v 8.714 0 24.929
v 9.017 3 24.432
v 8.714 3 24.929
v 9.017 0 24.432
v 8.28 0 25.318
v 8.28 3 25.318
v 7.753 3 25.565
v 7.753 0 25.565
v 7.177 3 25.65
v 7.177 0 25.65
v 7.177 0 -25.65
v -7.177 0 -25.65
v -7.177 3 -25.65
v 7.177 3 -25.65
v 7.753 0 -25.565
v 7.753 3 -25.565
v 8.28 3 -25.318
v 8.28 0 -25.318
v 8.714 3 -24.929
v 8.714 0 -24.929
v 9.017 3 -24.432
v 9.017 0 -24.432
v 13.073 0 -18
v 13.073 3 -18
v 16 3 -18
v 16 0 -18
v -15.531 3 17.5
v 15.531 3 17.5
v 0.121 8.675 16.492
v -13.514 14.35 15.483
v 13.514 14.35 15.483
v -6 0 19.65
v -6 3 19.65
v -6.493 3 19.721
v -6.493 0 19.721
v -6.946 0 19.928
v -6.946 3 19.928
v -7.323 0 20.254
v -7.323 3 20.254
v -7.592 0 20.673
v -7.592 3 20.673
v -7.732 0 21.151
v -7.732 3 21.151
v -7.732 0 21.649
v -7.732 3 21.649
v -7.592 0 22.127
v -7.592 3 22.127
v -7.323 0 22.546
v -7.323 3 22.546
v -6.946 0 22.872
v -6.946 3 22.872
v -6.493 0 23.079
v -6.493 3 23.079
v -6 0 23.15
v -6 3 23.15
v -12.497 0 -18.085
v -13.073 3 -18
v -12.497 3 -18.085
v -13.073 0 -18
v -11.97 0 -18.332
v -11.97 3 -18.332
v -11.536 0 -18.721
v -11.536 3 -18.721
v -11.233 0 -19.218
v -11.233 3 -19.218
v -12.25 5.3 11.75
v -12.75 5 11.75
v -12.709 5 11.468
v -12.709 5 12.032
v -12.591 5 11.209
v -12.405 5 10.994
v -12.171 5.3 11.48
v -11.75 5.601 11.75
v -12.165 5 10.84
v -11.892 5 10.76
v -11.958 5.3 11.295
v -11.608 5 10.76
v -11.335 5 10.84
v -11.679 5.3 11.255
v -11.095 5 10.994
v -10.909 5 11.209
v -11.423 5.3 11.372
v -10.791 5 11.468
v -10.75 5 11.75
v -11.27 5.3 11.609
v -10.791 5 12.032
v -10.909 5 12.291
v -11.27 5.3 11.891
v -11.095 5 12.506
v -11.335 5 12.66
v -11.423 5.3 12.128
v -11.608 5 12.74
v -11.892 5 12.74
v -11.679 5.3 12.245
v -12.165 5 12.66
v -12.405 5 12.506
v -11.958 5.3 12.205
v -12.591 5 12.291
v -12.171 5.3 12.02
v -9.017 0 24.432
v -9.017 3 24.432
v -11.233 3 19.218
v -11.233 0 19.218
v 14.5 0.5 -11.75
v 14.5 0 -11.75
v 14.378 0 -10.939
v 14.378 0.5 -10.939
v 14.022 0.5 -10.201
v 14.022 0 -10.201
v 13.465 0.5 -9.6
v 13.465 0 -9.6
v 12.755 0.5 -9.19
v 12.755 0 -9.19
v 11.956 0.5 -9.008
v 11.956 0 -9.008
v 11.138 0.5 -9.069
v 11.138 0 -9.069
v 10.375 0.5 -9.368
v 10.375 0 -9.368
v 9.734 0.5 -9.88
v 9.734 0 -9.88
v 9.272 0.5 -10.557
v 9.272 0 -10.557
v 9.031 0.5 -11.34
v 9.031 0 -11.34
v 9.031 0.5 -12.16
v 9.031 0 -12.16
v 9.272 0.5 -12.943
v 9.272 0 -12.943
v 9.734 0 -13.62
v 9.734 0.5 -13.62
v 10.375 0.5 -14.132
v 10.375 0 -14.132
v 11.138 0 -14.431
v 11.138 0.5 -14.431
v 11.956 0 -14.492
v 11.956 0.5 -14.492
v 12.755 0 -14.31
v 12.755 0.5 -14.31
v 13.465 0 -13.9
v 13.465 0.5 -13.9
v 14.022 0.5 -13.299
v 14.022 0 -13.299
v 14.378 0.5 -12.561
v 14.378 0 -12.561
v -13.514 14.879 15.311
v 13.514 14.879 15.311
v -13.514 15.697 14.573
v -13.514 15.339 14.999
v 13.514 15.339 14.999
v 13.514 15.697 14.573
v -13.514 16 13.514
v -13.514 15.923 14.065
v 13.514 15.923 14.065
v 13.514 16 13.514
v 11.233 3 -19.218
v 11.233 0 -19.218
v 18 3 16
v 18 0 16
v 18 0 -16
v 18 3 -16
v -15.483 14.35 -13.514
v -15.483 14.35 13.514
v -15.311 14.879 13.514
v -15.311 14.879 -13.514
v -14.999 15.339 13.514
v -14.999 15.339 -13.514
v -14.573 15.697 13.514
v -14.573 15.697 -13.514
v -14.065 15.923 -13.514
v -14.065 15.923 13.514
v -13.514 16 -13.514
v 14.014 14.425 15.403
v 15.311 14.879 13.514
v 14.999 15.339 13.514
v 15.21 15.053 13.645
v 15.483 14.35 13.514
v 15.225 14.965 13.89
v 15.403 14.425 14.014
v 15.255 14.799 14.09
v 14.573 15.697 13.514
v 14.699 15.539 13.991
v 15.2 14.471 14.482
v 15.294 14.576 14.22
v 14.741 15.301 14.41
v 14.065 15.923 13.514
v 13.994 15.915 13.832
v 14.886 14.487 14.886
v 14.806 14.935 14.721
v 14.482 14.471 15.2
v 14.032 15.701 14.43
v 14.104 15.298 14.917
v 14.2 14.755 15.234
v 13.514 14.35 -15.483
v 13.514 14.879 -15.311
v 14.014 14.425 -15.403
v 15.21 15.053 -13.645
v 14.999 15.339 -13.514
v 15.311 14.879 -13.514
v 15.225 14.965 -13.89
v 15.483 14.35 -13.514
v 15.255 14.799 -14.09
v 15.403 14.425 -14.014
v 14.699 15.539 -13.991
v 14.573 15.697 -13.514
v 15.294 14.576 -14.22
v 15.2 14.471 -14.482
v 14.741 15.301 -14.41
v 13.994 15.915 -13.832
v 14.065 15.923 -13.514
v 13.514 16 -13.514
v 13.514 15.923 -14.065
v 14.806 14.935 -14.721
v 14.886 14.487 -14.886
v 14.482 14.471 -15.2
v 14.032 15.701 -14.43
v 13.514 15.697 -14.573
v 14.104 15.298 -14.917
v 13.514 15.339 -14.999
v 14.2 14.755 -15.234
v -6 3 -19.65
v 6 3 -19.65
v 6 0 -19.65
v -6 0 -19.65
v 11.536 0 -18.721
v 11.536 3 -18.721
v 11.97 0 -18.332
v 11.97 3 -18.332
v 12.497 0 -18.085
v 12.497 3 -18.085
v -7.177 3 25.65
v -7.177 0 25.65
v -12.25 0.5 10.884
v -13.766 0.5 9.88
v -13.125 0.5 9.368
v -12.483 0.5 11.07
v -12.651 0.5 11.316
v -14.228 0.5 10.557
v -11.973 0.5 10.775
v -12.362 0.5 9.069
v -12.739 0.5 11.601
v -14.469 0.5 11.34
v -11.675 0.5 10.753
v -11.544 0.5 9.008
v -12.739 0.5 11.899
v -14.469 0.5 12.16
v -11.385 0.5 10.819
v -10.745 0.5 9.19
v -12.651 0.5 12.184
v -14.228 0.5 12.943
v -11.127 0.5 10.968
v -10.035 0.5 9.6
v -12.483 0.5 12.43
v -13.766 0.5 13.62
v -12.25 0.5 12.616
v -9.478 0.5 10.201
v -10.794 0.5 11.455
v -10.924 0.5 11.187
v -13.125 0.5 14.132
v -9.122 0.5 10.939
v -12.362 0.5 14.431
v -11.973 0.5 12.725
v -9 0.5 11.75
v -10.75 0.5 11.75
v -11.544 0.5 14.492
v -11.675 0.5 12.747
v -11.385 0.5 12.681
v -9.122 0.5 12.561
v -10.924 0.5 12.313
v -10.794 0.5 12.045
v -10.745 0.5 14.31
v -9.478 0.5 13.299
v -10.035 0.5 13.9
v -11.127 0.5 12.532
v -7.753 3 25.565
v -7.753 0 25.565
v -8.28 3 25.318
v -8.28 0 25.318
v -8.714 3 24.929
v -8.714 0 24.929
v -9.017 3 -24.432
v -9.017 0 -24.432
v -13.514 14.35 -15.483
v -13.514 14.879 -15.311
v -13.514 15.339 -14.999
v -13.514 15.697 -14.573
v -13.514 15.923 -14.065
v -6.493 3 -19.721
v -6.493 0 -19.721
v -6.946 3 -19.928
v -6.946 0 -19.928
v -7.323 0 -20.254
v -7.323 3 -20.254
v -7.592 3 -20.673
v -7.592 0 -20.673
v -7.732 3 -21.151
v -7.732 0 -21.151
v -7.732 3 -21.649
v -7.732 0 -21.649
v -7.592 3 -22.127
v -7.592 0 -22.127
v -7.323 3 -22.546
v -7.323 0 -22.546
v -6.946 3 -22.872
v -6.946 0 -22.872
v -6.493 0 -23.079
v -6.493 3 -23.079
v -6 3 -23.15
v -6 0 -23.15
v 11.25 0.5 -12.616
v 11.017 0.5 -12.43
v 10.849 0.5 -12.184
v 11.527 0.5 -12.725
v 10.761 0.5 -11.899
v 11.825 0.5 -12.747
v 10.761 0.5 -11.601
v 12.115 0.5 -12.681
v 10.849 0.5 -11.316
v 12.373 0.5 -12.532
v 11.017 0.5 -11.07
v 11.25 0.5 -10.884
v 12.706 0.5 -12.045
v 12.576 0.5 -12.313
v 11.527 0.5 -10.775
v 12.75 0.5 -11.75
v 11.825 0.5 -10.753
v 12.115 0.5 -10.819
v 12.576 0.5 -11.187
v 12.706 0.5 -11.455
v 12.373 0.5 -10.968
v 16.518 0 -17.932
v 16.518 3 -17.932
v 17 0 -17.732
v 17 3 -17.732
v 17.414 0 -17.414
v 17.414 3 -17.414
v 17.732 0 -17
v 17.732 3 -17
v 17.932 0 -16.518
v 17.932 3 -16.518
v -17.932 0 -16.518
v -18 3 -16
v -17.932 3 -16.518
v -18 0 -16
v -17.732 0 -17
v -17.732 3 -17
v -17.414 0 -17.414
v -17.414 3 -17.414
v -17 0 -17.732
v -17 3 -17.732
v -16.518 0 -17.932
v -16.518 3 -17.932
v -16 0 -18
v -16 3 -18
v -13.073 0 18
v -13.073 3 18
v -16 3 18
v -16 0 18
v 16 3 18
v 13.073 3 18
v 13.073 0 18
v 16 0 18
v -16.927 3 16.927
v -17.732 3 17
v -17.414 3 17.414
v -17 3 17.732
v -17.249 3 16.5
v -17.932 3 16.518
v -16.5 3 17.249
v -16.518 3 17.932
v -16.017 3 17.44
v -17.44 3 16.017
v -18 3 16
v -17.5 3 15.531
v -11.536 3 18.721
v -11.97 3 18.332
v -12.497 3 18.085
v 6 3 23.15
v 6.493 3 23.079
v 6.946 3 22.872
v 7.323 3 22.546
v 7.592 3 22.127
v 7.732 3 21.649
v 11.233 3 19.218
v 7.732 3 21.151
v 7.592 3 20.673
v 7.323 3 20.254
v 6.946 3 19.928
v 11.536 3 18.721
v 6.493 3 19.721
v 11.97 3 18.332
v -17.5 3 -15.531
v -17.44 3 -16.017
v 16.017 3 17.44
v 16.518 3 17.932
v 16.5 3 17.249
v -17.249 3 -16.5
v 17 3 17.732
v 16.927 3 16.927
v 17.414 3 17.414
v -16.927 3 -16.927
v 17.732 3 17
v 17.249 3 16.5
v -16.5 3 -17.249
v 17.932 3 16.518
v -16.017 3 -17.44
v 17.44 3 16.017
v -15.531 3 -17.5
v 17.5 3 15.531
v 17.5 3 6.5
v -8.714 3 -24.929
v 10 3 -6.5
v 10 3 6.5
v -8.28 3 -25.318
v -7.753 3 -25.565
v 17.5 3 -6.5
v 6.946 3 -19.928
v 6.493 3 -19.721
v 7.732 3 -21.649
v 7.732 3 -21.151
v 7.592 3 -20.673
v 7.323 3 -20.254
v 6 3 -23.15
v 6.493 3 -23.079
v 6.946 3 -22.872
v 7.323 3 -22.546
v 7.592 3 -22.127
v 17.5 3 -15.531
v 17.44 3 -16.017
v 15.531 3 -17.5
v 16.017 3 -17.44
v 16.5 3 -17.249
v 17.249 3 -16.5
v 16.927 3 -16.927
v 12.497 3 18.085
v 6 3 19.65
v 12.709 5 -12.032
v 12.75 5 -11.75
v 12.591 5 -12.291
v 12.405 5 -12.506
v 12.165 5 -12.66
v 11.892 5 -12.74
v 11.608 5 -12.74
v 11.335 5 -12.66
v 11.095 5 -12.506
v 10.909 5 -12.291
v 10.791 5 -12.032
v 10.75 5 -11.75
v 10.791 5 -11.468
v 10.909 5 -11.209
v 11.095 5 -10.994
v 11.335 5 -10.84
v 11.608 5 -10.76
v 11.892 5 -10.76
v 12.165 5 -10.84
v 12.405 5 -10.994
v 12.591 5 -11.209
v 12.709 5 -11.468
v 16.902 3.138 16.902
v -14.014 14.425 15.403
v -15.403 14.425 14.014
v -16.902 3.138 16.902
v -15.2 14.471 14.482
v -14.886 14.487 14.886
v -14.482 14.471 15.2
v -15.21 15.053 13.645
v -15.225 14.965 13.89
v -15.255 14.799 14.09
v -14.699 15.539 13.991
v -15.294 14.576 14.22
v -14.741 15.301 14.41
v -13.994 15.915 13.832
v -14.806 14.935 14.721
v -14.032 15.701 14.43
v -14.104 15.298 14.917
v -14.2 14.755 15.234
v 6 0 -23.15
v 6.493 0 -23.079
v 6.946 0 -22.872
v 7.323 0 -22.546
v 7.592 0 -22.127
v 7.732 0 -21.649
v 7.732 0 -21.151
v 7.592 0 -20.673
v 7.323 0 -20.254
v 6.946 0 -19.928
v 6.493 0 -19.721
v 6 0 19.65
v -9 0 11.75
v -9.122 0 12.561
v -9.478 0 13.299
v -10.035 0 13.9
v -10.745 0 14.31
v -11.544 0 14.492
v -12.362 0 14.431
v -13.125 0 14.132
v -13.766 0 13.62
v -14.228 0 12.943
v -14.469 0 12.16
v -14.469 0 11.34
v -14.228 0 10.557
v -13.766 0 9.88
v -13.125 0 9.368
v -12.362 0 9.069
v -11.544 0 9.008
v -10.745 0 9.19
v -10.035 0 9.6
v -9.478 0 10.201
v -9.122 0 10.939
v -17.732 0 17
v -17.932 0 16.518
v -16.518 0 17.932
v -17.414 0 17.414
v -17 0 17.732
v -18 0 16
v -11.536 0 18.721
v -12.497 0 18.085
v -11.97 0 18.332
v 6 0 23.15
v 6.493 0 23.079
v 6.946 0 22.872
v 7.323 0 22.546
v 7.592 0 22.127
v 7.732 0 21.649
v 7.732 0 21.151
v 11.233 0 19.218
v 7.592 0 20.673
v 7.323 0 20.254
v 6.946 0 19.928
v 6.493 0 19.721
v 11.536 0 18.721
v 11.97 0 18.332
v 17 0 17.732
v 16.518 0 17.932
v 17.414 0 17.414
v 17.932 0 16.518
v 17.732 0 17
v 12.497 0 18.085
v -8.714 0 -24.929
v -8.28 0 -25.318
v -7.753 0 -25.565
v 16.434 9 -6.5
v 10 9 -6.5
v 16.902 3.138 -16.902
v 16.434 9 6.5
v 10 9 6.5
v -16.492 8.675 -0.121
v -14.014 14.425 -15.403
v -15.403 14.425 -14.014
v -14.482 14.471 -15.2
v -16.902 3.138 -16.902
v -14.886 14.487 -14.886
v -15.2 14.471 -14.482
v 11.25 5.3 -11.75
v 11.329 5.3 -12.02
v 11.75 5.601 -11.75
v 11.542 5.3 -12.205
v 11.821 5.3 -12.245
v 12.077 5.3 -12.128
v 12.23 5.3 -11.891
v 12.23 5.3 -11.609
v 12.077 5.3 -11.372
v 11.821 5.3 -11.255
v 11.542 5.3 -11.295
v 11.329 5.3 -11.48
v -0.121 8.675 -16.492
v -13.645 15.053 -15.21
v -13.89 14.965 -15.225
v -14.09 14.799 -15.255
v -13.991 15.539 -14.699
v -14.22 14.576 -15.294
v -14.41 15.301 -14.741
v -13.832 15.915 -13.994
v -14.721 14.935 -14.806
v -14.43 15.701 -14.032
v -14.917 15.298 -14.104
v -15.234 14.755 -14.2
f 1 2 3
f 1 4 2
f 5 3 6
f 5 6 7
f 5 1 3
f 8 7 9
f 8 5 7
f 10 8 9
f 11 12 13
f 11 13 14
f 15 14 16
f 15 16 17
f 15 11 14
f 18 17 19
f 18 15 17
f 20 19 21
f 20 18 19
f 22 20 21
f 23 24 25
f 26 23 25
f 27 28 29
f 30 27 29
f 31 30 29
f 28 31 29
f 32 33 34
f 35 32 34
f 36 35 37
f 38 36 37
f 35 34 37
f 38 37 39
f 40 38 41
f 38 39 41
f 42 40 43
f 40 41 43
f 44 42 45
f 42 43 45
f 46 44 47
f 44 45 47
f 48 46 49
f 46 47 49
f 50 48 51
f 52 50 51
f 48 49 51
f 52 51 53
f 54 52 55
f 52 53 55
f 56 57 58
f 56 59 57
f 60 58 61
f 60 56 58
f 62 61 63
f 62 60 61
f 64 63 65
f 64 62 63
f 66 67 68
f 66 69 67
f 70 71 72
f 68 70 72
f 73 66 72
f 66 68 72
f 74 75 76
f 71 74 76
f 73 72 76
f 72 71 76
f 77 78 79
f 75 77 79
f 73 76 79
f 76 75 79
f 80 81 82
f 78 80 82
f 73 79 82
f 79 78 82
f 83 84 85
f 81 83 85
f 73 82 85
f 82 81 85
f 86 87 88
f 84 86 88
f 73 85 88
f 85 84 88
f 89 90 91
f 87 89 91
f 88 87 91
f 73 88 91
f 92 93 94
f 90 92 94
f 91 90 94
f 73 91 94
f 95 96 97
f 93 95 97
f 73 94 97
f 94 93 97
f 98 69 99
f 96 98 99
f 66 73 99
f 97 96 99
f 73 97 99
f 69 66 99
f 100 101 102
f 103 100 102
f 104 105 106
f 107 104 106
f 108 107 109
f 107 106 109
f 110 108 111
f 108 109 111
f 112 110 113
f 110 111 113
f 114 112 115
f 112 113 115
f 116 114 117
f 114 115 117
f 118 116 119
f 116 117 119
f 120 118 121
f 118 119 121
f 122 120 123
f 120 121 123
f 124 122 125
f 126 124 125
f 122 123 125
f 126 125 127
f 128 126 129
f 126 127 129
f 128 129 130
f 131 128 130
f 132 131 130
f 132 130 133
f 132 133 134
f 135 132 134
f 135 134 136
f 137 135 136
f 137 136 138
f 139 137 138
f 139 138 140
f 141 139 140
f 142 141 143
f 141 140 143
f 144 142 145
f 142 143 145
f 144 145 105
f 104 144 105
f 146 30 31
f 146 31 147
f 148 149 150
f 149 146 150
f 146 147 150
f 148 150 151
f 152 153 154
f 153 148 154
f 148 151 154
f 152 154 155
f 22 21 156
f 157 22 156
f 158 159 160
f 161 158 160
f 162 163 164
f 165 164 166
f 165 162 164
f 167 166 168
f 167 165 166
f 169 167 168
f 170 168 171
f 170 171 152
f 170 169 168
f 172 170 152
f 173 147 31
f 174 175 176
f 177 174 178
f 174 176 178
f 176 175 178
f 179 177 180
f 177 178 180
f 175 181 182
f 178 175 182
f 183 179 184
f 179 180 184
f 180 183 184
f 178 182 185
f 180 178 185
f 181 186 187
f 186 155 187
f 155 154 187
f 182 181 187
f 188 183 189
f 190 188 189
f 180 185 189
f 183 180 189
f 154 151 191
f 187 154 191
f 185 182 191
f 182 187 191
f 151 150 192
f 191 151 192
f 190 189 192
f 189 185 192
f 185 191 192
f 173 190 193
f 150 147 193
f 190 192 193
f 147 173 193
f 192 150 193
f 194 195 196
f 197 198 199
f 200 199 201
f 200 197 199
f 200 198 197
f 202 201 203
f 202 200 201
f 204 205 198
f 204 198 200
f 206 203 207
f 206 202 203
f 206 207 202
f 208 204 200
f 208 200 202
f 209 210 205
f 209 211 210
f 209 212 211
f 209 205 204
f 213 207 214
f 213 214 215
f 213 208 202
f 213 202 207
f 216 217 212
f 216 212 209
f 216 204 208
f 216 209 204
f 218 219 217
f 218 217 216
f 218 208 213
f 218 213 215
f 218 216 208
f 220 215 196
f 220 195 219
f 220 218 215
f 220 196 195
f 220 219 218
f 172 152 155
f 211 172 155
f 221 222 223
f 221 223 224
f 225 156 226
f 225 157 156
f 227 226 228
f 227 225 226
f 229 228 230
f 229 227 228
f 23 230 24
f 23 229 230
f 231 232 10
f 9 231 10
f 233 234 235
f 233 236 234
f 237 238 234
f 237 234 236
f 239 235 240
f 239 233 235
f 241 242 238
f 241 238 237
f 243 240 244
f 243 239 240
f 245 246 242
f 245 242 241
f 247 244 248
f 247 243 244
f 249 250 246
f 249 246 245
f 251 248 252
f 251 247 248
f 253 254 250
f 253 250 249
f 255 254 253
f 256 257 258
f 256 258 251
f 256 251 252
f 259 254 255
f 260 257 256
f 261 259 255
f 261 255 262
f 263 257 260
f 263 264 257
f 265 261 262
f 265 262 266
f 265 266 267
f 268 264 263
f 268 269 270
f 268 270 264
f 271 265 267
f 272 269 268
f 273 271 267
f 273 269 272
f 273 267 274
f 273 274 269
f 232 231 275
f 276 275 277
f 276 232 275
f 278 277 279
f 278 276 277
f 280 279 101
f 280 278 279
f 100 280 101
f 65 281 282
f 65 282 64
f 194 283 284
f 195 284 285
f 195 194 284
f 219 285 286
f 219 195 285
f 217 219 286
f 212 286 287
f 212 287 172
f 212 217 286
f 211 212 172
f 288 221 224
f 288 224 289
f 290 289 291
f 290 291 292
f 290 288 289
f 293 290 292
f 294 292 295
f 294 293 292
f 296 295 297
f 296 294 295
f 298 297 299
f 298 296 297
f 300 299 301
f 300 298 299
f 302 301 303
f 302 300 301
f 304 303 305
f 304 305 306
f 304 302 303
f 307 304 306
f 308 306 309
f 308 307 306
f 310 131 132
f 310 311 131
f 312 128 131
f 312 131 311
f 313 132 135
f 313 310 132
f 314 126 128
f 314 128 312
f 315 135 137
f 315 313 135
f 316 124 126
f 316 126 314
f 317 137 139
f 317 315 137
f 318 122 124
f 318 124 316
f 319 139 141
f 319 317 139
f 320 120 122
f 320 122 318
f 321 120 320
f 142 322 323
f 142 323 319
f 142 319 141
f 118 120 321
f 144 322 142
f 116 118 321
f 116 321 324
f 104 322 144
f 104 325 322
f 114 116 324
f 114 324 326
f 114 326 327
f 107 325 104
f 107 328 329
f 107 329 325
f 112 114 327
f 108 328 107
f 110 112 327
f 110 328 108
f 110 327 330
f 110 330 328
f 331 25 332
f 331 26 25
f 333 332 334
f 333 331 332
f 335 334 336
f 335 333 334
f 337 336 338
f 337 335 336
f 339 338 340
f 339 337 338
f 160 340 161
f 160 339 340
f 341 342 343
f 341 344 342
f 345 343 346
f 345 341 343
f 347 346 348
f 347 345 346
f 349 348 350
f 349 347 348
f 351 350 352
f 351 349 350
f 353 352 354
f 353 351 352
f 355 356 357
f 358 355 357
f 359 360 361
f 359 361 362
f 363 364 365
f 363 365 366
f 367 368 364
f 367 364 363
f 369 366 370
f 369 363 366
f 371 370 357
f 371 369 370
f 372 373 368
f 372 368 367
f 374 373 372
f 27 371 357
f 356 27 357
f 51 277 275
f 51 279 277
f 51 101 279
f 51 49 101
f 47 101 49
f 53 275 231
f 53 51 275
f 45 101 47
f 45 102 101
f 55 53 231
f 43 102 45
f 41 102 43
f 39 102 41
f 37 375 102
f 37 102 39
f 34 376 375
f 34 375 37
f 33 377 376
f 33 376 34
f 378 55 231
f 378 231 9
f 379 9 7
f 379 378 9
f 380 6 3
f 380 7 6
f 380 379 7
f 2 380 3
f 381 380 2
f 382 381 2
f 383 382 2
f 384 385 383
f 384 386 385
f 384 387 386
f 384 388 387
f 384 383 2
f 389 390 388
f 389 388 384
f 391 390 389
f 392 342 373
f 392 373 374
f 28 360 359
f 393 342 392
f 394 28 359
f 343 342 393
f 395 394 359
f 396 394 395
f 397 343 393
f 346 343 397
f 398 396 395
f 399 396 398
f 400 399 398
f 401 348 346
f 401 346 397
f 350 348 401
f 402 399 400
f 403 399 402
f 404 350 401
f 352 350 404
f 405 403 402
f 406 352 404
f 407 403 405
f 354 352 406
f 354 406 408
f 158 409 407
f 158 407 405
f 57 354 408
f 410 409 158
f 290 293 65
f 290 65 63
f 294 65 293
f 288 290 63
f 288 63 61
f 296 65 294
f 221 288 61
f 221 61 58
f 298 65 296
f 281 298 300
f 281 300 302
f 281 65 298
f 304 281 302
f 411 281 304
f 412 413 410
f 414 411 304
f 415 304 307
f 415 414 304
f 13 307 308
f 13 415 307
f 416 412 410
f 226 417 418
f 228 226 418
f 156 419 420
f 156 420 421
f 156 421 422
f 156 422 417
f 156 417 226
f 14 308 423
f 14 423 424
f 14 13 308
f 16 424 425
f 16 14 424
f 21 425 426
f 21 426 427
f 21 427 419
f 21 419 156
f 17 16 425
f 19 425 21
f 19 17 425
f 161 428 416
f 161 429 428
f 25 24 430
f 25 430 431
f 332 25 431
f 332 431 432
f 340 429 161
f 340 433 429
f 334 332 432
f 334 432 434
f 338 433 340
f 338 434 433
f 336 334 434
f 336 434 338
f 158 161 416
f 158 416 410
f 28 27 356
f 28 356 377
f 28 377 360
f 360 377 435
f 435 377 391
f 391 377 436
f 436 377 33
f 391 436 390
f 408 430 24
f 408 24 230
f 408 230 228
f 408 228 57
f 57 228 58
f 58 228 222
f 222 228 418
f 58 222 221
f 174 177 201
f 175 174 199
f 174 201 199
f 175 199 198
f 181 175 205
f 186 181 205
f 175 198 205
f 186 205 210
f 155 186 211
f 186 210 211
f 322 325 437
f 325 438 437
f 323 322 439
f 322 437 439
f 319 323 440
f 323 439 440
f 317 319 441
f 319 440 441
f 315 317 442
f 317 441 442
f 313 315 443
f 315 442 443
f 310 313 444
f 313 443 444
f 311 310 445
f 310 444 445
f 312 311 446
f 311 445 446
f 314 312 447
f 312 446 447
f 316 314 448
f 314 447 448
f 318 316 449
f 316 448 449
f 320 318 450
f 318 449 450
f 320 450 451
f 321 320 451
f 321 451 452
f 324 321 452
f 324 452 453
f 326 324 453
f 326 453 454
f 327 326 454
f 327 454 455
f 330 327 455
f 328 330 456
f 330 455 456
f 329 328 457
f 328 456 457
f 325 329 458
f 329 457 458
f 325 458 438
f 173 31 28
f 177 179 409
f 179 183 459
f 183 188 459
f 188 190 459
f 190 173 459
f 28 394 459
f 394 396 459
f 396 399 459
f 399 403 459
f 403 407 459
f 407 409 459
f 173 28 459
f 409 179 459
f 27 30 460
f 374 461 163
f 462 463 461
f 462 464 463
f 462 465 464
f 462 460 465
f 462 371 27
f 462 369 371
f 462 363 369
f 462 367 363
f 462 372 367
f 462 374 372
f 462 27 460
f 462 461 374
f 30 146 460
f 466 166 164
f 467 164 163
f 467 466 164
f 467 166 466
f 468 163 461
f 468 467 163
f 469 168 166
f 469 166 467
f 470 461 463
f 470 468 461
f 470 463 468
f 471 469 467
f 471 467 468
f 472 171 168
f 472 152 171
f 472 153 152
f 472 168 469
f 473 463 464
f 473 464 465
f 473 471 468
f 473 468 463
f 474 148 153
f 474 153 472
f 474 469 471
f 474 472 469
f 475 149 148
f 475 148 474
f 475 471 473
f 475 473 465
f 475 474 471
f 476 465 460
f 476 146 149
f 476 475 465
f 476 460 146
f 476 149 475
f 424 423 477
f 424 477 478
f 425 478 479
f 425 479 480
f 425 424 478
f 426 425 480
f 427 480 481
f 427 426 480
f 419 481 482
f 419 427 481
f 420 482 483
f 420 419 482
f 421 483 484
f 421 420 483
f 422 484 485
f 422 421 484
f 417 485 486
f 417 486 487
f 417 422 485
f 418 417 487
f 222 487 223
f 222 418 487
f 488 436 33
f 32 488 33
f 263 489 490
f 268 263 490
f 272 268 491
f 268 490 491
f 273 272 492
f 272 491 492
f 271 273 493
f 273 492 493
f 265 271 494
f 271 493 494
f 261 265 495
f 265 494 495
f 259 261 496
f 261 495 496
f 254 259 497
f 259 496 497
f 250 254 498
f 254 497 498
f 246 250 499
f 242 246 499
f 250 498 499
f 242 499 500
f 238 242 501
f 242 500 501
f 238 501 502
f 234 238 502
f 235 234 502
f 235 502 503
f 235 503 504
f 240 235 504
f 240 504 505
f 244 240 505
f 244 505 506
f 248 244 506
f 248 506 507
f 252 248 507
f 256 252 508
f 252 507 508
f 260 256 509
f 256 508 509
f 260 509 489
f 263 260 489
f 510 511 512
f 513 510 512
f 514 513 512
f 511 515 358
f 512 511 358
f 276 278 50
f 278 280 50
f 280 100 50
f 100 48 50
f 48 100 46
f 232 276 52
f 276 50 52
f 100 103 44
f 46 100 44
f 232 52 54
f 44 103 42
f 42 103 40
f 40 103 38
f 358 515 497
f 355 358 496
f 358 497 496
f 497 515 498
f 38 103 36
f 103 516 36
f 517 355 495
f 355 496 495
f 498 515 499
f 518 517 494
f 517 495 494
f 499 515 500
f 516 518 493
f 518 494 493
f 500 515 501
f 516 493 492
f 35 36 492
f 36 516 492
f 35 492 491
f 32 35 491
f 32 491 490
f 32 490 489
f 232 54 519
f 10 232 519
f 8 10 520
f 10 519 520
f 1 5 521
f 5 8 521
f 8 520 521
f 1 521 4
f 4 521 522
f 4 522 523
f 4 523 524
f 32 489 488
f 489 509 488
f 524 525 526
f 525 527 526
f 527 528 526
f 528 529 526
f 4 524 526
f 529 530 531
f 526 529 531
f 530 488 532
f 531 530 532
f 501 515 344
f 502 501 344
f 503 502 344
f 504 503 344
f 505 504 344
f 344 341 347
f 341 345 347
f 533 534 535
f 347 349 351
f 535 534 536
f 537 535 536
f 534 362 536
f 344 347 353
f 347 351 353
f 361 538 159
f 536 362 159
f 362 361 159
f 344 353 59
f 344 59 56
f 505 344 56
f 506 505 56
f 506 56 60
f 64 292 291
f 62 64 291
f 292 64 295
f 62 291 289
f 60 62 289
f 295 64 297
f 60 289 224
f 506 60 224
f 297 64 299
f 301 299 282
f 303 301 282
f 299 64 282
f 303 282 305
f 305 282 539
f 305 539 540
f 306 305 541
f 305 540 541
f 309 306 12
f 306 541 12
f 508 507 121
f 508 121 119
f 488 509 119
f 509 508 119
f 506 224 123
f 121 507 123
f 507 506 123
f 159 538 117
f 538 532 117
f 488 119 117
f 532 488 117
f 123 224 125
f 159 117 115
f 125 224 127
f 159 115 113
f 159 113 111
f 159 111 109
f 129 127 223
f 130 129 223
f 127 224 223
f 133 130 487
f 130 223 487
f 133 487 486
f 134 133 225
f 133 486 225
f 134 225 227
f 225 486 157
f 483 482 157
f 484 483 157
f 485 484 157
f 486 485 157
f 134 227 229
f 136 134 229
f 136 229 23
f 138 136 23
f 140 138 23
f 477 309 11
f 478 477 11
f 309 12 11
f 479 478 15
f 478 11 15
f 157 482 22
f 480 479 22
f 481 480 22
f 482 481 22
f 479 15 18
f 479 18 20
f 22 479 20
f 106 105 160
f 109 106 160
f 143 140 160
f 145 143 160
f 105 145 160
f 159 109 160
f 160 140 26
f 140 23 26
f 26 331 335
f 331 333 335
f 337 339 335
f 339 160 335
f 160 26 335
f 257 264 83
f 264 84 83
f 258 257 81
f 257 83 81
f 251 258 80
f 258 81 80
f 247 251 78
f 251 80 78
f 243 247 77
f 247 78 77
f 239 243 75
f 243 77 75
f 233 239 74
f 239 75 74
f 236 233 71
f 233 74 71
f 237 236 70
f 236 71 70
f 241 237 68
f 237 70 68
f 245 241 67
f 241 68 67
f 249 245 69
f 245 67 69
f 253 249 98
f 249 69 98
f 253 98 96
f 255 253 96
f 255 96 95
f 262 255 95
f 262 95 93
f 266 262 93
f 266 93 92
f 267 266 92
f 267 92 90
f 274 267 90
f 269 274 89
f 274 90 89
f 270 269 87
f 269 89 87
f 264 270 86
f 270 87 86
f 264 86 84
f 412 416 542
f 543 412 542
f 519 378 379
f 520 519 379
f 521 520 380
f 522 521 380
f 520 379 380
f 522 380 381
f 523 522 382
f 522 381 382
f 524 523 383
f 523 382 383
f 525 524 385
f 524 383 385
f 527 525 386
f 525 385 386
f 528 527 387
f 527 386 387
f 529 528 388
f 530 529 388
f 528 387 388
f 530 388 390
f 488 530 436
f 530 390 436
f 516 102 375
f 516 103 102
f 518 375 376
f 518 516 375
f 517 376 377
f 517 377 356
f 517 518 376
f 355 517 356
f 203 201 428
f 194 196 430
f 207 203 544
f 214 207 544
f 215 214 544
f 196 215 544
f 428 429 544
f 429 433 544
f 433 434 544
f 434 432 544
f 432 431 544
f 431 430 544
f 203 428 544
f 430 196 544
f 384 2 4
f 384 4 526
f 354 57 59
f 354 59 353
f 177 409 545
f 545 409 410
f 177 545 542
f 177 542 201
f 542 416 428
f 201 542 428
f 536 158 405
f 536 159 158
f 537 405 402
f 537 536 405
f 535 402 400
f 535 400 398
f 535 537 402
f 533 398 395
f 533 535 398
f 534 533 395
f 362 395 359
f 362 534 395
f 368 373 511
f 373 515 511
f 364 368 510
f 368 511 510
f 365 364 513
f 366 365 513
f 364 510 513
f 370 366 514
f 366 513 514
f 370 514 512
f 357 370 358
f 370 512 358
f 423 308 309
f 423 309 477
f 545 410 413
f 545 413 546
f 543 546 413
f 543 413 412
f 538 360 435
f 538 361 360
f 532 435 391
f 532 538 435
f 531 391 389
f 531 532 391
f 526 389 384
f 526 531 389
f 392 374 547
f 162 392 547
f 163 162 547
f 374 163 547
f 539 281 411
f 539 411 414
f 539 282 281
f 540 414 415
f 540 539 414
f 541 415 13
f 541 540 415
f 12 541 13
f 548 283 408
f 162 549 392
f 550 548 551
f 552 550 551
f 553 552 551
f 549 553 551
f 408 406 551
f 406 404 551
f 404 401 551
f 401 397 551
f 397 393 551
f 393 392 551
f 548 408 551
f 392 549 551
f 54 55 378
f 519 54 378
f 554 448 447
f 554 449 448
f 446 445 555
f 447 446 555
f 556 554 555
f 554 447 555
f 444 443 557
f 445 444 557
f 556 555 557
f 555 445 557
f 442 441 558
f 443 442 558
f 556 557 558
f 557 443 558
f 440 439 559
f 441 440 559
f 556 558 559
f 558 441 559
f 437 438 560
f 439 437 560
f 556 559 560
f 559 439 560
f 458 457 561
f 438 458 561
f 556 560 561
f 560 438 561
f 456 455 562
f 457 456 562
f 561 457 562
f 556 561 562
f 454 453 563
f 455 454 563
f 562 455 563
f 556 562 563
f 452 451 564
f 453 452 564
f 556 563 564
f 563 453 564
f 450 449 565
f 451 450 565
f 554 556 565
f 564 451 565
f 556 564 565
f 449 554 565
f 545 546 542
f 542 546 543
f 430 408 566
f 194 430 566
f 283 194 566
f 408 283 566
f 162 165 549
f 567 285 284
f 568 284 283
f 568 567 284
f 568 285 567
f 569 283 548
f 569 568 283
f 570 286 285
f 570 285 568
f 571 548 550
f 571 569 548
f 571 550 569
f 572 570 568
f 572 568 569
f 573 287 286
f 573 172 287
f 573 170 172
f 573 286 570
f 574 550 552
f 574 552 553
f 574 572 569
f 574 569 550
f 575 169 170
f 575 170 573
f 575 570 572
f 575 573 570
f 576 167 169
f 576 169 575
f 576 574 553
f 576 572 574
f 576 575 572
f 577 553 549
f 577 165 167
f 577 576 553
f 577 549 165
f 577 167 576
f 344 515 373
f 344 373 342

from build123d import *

# Parameters (mm, degrees)
SKETCH_1_W          = 36
SKETCH_1_H          = 51.3
EXTRUDE_1_DEPTH     = 3
CUT_EXTRUDE_1_DEPTH = 3
SKETCH_5_W          = 30.38
SKETCH_5_H          = 30.38
SKETCH_4_W          = 35
SKETCH_4_H          = 35
FILLET_1_R          = 2
CUT_EXTRUDE_3_DEPTH = 13
FILLET_2_R          = 2
SKETCH_8_R          = 2.75
CUT_EXTRUDE_4_DEPTH = 0.5
MM_2_D              = 2
MM_2_DEPTH          = 5
MM_2_TIP            = 0.600860619
CUT_EXTRUDE_START   = 10
SKETCH_16_W         = 13
SKETCH_16_H         = 6
CUT_EXTRUDE_5_DEPTH = 9.0000001


with BuildPart() as part:
    # 草图1 → 凸台-拉伸1 (new body)
    with BuildSketch(Plane(origin=(0, 0, 0), x_dir=(1, 0, 0), z_dir=(0, 1, 0))):
        Rectangle(SKETCH_1_W, SKETCH_1_H)
    extrude(amount=EXTRUDE_1_DEPTH)

    # 草图2 → 切除-拉伸1 (cut)
    with BuildSketch(Plane(origin=(0, 3, 0), x_dir=(1, 0, 0), z_dir=(0, 1, 0))):
        with BuildLine():
            Line((-6, 23.15), (6, 23.15))
            ThreePointArc((6, 23.15), (7.75, 21.4), (6, 19.65))
            Line((6, 19.65), (-6, 19.65))
            ThreePointArc((-6, 19.65), (-7.75, 21.4), (-6, 23.15))
        make_face()
        with BuildLine():
            Line((-6, -23.15), (6, -23.15))
            ThreePointArc((6, -23.15), (7.75, -21.4), (6, -19.65))
            Line((6, -19.65), (-6, -19.65))
            ThreePointArc((-6, -19.65), (-7.75, -21.4), (-6, -23.15))
        make_face()
    extrude(amount=-CUT_EXTRUDE_1_DEPTH, mode=Mode.SUBTRACT)

    # 草图5 → 放样1 section 0
    with BuildSketch(Plane(origin=(0, 16, 0), x_dir=(1, 0, 0), z_dir=(0, 1, 0))):
        Rectangle(SKETCH_5_W, SKETCH_5_H)
    # 草图4 → 放样1 section 1
    with BuildSketch(Plane(origin=(0, 3, 0), x_dir=(1, 0, 0), z_dir=(0, 1, 0))):
        Rectangle(SKETCH_4_W, SKETCH_4_H)
    loft()

    # 圆角1
    fillet_1_edges = [part.edges().sort_by_distance(p)[0] for p in [
        (0, 16, 15.19),
        (-15.19, 16, 0),
        (0, 16, -15.19),
        (15.19, 16, 0),
        (16.345, 9.5, -16.345),
        (16.345, 9.5, 16.345),
        (-16.345, 9.5, 16.345),
        (-16.345, 9.5, -16.345),
    ]]
    fillet(fillet_1_edges, radius=FILLET_1_R)

    # 草图6 → 切除-拉伸3 (cut)
    with BuildSketch(Plane(origin=(0, 3, 0), x_dir=(1, 0, 0), z_dir=(0, 1, 0))):
        Polygon((-8.5, 25.65), (-11.75, 18), (-18, 18), (-18, 25.65), align=None)
        Polygon((18, 25.65), (8.5, 25.65), (11.75, 18), (18, 18), align=None)
        Polygon((8.5, -25.65), (11.75, -18), (18, -18), (18, -25.65), align=None)
        Polygon((-18, -25.65), (-8.5, -25.65), (-11.75, -18), (-18, -18), align=None)
    extrude(amount=-CUT_EXTRUDE_3_DEPTH, mode=Mode.SUBTRACT)

    # 圆角2
    fillet_2_edges = [part.edges().sort_by_distance(p)[0] for p in [
        (-8.5, 1.5, -25.65),
        (-11.75, 1.5, -18),
        (-18, 1.5, -18),
        (18, 1.5, -18),
        (11.75, 1.5, -18),
        (8.5, 1.5, -25.65),
        (8.5, 1.5, 25.65),
        (11.75, 1.5, 18),
        (18, 1.5, 18),
        (-18, 1.5, 18),
        (-11.75, 1.5, 18),
        (-8.5, 1.5, 25.65),
    ]]
    fillet(fillet_2_edges, radius=FILLET_2_R)

    # 草图8 → 切除-拉伸4 (cut)
    with BuildSketch(Plane.XZ):
        with Locations((-11.75, 11.75)):
            Circle(SKETCH_8_R)
        with Locations((11.75, -11.75)):
            Circle(SKETCH_8_R)
    extrude(amount=-CUT_EXTRUDE_4_DEPTH, mode=Mode.SUBTRACT)

    # 大小mm 暗销孔2
    with Locations(Plane(origin=(0, 0, 0), x_dir=(-1, 0, 0), z_dir=(0, -1, 0))):
        with Locations((11.75, -11.75), (-11.75, 11.75)):
            Hole(MM_2_D / 2, depth=MM_2_DEPTH)
            with Locations((0, 0, -(MM_2_DEPTH + MM_2_TIP / 2))):  # 118° drill point
                Cone(0, MM_2_D / 2, MM_2_TIP, mode=Mode.SUBTRACT)

    # 草图16 → 切除-拉伸5 (cut, through all)
    with BuildSketch(Plane(origin=(0, 0, 0), x_dir=(0, 0, -1), z_dir=(1, 0, 0)).offset(CUT_EXTRUDE_START)):
        with Locations((0, 6)):
            Rectangle(SKETCH_16_W, SKETCH_16_H)
    extrude(amount=CUT_EXTRUDE_5_DEPTH, mode=Mode.SUBTRACT)


solid = part.part
